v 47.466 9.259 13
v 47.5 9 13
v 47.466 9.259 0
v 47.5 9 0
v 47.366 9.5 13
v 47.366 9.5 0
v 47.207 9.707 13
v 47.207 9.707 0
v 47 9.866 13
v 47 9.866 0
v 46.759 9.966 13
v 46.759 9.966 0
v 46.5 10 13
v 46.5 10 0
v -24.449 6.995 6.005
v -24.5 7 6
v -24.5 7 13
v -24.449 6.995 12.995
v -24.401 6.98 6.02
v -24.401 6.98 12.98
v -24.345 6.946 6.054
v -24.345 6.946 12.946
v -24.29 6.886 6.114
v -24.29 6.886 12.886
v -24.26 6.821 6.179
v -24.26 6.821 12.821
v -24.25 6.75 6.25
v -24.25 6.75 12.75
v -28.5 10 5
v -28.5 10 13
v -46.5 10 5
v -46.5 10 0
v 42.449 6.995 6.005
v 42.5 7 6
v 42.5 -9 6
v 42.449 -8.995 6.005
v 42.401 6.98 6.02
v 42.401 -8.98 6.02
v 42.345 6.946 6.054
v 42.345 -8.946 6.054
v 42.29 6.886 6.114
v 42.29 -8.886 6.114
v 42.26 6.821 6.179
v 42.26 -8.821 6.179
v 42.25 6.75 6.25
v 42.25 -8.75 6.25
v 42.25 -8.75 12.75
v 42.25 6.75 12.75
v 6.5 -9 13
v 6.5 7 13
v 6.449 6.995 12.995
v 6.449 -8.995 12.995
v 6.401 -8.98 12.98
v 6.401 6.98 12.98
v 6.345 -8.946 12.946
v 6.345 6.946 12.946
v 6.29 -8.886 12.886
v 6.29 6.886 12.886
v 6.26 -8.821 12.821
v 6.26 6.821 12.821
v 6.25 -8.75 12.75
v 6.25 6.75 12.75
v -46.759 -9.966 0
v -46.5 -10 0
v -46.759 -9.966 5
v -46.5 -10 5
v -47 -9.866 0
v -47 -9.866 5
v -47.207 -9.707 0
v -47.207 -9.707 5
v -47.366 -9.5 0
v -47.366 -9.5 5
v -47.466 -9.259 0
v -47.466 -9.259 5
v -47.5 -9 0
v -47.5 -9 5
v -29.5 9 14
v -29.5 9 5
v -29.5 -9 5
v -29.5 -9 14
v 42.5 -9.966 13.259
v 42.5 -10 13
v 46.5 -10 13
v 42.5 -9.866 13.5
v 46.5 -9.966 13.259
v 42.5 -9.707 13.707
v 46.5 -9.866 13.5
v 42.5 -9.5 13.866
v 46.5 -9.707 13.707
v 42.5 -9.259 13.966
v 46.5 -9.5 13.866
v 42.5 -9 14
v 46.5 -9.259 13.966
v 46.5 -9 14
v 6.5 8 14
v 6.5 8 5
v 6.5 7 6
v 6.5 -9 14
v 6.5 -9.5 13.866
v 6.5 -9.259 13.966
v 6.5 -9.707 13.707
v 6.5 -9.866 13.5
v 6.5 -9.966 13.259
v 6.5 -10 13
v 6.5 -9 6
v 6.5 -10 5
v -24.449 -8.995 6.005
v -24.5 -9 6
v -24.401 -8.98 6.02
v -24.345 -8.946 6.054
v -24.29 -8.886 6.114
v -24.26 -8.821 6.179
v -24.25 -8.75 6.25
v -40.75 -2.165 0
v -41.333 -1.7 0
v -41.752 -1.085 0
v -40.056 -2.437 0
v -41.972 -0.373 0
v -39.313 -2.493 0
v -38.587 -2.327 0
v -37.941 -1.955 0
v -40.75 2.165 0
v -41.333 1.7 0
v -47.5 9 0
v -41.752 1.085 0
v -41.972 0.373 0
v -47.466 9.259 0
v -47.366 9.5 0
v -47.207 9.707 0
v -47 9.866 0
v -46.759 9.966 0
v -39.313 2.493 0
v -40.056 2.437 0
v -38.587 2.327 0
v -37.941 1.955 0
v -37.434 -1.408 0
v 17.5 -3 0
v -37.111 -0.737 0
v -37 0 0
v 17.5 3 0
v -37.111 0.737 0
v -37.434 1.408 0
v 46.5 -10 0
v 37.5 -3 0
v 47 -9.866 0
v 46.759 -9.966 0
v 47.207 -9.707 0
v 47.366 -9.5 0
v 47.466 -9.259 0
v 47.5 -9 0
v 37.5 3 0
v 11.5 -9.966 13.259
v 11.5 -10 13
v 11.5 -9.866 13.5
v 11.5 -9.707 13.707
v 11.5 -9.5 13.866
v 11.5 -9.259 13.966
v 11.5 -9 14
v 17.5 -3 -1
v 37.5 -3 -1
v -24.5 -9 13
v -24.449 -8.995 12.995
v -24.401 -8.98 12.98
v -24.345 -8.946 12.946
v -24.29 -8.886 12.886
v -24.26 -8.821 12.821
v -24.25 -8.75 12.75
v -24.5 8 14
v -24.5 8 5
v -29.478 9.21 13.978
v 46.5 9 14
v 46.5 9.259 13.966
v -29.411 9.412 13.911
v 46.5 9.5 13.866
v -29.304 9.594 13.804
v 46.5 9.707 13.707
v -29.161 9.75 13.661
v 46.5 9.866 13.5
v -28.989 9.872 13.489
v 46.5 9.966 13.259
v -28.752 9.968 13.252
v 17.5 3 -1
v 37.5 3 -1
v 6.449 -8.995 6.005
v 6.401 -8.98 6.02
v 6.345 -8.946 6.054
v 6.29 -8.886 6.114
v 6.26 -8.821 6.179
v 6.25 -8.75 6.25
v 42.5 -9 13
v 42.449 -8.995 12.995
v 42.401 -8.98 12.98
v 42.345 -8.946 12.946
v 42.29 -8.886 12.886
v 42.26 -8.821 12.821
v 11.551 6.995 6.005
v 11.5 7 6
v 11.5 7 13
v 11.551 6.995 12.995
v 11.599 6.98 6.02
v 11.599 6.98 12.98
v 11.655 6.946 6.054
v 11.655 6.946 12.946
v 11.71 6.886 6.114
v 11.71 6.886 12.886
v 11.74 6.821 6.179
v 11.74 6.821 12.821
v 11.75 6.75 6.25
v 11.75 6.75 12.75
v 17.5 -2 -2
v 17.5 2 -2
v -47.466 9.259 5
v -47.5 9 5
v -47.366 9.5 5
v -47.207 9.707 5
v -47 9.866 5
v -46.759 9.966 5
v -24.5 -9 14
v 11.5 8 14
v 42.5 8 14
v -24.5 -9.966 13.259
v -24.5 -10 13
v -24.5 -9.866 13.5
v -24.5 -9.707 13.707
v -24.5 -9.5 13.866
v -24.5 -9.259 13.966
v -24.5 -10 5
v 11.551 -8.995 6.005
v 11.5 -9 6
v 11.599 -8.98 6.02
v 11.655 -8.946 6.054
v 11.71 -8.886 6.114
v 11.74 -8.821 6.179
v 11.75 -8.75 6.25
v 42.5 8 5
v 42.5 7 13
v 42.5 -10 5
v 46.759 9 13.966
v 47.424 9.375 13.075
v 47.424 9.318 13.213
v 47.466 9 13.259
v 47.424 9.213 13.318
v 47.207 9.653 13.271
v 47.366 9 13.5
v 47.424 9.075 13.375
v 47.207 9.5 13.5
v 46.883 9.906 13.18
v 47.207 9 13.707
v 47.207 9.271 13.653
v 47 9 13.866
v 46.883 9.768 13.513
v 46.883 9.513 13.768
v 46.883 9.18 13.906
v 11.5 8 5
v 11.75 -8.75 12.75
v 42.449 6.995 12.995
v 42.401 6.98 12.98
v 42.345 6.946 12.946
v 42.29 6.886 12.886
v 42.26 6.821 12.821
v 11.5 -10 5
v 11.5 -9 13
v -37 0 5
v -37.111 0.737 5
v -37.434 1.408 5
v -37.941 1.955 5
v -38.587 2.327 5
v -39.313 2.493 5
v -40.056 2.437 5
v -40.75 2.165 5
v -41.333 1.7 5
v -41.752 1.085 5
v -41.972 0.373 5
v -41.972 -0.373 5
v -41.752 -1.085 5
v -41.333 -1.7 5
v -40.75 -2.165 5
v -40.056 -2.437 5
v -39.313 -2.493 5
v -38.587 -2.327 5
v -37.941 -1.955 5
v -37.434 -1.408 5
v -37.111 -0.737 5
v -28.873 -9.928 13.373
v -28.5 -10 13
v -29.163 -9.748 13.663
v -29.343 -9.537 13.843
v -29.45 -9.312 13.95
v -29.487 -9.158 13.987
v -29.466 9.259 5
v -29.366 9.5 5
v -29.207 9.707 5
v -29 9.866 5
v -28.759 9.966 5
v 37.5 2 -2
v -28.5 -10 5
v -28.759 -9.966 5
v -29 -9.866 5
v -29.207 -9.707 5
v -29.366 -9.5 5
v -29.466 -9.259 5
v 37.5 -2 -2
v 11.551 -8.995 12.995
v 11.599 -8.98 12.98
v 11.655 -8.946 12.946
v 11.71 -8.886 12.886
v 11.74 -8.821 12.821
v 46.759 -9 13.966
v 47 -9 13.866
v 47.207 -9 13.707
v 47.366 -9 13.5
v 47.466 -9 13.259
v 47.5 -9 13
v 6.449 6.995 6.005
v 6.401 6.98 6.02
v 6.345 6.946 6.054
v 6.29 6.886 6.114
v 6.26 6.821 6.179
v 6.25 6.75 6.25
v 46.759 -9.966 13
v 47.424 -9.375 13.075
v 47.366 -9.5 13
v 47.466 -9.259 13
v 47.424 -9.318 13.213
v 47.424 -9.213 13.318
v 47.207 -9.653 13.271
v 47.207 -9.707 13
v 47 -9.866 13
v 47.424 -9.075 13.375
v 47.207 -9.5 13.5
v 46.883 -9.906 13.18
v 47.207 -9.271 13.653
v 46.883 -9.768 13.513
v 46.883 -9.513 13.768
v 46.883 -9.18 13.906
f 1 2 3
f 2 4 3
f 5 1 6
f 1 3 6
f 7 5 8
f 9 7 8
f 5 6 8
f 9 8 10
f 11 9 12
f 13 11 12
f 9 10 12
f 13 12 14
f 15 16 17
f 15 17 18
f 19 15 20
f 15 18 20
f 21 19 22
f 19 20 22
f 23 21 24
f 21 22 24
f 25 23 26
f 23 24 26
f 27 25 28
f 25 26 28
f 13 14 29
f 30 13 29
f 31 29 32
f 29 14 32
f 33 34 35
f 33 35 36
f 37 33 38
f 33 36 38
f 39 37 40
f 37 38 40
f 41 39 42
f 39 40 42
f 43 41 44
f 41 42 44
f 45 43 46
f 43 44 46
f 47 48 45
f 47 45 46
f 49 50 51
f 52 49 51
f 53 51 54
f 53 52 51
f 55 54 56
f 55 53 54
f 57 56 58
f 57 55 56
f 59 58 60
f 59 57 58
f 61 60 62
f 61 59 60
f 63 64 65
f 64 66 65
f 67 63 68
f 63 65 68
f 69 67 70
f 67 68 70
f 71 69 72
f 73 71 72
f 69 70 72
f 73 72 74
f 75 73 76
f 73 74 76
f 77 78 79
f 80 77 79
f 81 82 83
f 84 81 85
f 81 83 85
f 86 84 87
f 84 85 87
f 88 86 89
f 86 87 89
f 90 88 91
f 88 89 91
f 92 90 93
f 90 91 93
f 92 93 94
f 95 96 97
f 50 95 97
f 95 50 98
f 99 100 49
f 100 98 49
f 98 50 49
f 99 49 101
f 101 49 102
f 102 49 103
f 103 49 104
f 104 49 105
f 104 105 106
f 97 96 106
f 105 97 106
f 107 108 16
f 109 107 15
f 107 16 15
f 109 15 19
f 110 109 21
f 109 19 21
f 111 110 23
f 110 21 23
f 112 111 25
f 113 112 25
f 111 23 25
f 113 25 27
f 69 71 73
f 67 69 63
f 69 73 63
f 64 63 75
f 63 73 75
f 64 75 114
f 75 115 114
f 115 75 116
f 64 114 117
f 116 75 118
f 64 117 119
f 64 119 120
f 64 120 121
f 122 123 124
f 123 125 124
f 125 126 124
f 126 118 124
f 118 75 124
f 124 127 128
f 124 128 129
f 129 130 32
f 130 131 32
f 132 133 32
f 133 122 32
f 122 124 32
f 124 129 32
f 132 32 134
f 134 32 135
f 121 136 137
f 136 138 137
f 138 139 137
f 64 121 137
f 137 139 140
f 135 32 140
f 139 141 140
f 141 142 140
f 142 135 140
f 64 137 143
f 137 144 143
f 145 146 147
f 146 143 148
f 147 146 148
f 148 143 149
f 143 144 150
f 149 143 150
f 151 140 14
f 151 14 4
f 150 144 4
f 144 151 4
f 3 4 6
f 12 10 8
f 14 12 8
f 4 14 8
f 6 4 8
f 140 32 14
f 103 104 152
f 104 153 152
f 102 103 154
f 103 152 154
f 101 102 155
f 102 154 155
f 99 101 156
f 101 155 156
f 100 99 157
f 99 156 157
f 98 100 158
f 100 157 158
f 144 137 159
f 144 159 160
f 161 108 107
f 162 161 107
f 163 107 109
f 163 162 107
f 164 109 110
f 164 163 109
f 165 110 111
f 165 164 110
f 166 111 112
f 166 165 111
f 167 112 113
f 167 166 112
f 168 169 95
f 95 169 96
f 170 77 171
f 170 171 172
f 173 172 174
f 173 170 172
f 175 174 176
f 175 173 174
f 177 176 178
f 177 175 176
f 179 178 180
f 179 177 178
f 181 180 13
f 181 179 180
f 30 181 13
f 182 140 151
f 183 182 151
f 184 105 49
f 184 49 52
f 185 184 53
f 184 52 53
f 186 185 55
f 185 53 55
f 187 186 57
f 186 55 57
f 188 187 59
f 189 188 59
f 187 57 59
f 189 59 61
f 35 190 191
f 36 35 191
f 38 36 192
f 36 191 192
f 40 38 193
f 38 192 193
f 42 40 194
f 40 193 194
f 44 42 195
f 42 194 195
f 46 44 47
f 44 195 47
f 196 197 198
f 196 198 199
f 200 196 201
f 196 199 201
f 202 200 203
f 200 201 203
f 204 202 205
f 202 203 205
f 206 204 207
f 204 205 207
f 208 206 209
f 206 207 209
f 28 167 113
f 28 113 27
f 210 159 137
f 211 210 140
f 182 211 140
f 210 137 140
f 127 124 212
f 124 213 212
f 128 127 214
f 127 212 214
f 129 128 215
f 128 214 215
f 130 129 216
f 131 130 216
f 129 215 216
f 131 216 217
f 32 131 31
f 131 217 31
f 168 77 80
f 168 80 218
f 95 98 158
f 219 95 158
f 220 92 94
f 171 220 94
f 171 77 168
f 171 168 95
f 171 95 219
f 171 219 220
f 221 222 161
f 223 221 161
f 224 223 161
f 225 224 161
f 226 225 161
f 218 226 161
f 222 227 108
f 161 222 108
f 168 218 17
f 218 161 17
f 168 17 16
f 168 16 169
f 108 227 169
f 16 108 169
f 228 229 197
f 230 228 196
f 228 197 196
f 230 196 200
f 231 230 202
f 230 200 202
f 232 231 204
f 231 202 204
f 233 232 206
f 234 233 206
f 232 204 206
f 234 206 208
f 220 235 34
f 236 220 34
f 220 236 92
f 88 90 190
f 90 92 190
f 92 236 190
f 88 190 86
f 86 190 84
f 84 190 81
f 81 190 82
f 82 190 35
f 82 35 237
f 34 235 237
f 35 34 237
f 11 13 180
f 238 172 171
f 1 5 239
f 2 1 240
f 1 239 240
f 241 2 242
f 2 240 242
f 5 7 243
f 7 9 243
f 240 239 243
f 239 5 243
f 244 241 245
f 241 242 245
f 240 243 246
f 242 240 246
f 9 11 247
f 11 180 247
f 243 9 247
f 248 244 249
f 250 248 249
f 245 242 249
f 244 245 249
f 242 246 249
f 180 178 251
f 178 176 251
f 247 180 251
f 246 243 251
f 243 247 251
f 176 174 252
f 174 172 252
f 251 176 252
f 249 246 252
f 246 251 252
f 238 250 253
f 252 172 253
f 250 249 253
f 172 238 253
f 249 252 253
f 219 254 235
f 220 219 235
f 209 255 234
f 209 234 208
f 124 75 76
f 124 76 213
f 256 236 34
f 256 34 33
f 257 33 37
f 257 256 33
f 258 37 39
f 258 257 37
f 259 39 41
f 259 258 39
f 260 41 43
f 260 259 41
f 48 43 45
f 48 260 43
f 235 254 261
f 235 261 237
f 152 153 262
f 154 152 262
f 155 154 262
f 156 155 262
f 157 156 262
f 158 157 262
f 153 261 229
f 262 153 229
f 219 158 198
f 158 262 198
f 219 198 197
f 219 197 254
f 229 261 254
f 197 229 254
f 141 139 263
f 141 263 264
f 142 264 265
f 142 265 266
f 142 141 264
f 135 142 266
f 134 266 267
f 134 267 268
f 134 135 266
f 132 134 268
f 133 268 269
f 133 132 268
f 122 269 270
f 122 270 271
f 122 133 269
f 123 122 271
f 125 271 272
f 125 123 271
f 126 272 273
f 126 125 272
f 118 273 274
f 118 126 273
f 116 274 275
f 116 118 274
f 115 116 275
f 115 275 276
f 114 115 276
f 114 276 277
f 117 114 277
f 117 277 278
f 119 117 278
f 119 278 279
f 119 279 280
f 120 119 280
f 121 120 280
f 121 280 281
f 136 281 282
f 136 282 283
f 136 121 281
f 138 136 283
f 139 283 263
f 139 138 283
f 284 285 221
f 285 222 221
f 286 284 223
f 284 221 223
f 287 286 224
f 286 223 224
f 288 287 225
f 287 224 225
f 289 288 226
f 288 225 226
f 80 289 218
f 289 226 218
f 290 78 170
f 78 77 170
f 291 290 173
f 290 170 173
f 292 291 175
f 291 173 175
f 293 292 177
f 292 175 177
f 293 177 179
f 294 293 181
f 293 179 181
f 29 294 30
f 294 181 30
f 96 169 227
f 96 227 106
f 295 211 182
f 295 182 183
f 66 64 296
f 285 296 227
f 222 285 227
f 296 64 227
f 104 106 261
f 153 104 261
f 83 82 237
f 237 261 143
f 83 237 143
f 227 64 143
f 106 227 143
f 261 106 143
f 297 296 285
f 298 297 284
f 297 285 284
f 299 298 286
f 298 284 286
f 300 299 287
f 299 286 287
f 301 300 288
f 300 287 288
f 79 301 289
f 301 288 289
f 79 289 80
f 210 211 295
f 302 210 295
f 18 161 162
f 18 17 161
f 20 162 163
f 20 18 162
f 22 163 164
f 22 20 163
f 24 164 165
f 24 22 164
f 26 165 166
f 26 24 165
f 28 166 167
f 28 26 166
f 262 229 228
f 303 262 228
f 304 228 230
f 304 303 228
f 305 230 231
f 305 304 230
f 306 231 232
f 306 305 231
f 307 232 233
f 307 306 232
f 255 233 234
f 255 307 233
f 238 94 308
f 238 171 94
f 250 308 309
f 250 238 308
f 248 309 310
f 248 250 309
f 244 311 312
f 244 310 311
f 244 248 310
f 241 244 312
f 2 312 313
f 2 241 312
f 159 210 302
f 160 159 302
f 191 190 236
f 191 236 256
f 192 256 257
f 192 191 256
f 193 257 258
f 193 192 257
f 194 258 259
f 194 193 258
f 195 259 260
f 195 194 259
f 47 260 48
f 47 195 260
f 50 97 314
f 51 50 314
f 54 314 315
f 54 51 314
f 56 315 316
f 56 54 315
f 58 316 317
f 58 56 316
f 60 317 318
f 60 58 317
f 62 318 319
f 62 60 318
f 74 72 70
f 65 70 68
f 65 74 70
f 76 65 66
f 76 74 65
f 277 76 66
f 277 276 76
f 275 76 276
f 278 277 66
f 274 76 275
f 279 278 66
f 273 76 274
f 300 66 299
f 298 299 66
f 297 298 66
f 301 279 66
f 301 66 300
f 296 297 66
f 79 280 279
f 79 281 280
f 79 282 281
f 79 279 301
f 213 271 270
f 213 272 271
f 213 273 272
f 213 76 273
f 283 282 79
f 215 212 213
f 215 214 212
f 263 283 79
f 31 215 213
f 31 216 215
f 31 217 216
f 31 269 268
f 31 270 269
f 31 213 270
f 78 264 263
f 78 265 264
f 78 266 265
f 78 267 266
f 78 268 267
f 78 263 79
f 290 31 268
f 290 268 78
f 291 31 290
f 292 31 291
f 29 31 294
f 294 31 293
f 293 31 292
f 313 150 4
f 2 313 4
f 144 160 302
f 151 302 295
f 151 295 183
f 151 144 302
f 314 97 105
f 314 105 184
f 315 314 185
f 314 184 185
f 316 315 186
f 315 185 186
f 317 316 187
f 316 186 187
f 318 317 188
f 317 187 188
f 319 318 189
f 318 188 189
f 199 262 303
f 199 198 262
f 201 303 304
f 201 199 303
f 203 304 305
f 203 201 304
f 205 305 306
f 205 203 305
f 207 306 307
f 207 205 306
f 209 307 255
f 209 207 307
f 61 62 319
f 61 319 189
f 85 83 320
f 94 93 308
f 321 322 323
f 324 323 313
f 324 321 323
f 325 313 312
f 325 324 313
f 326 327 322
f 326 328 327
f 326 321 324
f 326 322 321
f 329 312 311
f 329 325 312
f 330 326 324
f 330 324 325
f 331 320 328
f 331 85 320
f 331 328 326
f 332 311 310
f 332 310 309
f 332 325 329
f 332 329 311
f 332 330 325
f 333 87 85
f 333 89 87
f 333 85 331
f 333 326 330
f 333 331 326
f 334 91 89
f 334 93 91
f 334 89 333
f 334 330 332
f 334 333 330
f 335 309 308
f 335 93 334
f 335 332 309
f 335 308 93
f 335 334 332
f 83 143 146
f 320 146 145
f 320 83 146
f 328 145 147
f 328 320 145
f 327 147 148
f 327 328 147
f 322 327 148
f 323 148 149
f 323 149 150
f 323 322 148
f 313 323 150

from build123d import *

# Parameters (mm, degrees)
F0_W      = 18
F0_H      = 20
F0_R      = 2.5
F0_W_2    = 31
F0_H_2    = 18
F0_H_3    = 2
F1_DEPTH  = 5
F2_DEPTH  = 14
F3_W      = 16
F3_H      = 7
F5_W      = 16
F5_H      = 7
F7_DEPTH  = 0.25
F4_W      = 16
F4_H      = 7
F6_W      = 16
F6_H      = 7
F8_DEPTH  = 0.25
F9_R      = 0.24999
F10_R     = 1
F11_W     = 20
F11_H     = 6
F12_DEPTH = 2
F13_SIZE  = 1


# Not quite as in the source:
# - a fillet or chamfer is up to 0.001 mm smaller than in the source, because OpenCascade refuses the exact size


with BuildPart() as f1:
    # F0 (on Top) → F1 (new body)
    with BuildSketch(Plane.XY):
        with Locations((-38.5, 0)):
            Rectangle(F0_W, F0_H)
        with Locations((-39.5, 0)):
            Circle(F0_R, mode=Mode.SUBTRACT)
        Polygon((-24.5, 10), (-29.5, 10), (-29.5, -10), (-24.5, -10), (-24.5, 8), align=None)
        with Locations((-9, -1)):
            Rectangle(F0_W_2, F0_H_2)
        Polygon((11.5, 10), (6.5, 10), (6.5, 8), (6.5, -10), (11.5, -10), (11.5, 8), align=None)
        Polygon((47.5, 10), (42.5, 10), (42.5, 8), (42.5, -10), (47.5, -10), align=None)
        with Locations((-9, 9)):
            Rectangle(F0_W_2, F0_H_3)
        with Locations((27, -1)):
            Rectangle(F0_W_2, F0_H_2)
        with Locations((27, 9)):
            Rectangle(F0_W_2, F0_H_3)
    extrude(amount=F1_DEPTH)

    # F0 (on Top) → F2 (join)
    with BuildSketch(Plane.XY):
        Polygon((-24.5, 10), (-29.5, 10), (-29.5, -10), (-24.5, -10), (-24.5, 8), align=None)
        Polygon((11.5, 10), (6.5, 10), (6.5, 8), (6.5, -10), (11.5, -10), (11.5, 8), align=None)
        Polygon((47.5, 10), (42.5, 10), (42.5, 8), (42.5, -10), (47.5, -10), align=None)
        with Locations((-9, 9)):
            Rectangle(F0_W_2, F0_H_3)
        with Locations((27, 9)):
            Rectangle(F0_W_2, F0_H_3)
    extrude(amount=F2_DEPTH)

    # F3 (on face) + F5 (on face) → F7 (join)
    with BuildSketch(Plane.YZ.offset(-24.5)):
        with Locations((-1, 9.5)):
            Rectangle(F3_W, F3_H)
    with BuildSketch(Plane.YZ.offset(11.5)):
        with Locations((-1, 9.5)):
            Rectangle(F5_W, F5_H)
    extrude(amount=F7_DEPTH)

    # F4 (on face) + F6 (on face) → F8 (join)
    with BuildSketch(Plane(origin=(6.5, 0, 0), x_dir=(0, -1, 0), z_dir=(-1, 0, 0))):
        with Locations((1, 9.5)):
            Rectangle(F4_W, F4_H)
    with BuildSketch(Plane(origin=(42.5, 0, 0), x_dir=(0, -1, 0), z_dir=(-1, 0, 0))):
        with Locations((1, 9.5)):
            Rectangle(F6_W, F6_H)
    extrude(amount=F8_DEPTH)

    # F9 (radius 0.25 in the source; OpenCascade refuses exactly that, so slightly less here)
    f9_edges = [f1.edges().sort_by_distance(p)[0] for p in [
        (-24.25, -1, 13),
        (-24.25, -9, 9.5),
        (-24.25, -1, 6),
        (-24.25, 7, 9.5),
        (6.25, 7, 9.5),
        (6.25, -1, 6),
        (6.25, -9, 9.5),
        (6.25, -1, 13),
        (11.75, -1, 13),
        (11.75, -9, 9.5),
        (11.75, -1, 6),
        (11.75, 7, 9.5),
        (42.25, -1, 13),
        (42.25, 7, 9.5),
        (42.25, -1, 6),
        (42.25, -9, 9.5),
    ]]
    fillet(f9_edges, radius=F9_R)

    # F10
    f10_edges = [f1.edges().sort_by_distance(p)[0] for p in [
        (-27, -10, 14),
        (9, -10, 14),
        (45, -10, 14),
        (9, 10, 14),
        (-47.5, -10, 2.5),
        (-47.5, 10, 2.5),
        (47.5, -10, 7),
        (47.5, 10, 7),
        (47.5, 0, 14),
        (-29.5, -10, 9.5),
        (-29.5, 10, 9.5),
    ]]
    fillet(f10_edges, radius=F10_R)

    # F11 (on face) → F12 (join)
    with BuildSketch(Plane.XY):
        with Locations((27.5, 0)):
            Rectangle(F11_W, F11_H)
    extrude(amount=-F12_DEPTH)

    # F13
    f13_edges = [f1.edges().sort_by_distance(p)[0] for p in [
        (27.5, -3, -2),
        (27.5, 3, -2),
    ]]
    chamfer(f13_edges, length=F13_SIZE)


solid = f1.part
